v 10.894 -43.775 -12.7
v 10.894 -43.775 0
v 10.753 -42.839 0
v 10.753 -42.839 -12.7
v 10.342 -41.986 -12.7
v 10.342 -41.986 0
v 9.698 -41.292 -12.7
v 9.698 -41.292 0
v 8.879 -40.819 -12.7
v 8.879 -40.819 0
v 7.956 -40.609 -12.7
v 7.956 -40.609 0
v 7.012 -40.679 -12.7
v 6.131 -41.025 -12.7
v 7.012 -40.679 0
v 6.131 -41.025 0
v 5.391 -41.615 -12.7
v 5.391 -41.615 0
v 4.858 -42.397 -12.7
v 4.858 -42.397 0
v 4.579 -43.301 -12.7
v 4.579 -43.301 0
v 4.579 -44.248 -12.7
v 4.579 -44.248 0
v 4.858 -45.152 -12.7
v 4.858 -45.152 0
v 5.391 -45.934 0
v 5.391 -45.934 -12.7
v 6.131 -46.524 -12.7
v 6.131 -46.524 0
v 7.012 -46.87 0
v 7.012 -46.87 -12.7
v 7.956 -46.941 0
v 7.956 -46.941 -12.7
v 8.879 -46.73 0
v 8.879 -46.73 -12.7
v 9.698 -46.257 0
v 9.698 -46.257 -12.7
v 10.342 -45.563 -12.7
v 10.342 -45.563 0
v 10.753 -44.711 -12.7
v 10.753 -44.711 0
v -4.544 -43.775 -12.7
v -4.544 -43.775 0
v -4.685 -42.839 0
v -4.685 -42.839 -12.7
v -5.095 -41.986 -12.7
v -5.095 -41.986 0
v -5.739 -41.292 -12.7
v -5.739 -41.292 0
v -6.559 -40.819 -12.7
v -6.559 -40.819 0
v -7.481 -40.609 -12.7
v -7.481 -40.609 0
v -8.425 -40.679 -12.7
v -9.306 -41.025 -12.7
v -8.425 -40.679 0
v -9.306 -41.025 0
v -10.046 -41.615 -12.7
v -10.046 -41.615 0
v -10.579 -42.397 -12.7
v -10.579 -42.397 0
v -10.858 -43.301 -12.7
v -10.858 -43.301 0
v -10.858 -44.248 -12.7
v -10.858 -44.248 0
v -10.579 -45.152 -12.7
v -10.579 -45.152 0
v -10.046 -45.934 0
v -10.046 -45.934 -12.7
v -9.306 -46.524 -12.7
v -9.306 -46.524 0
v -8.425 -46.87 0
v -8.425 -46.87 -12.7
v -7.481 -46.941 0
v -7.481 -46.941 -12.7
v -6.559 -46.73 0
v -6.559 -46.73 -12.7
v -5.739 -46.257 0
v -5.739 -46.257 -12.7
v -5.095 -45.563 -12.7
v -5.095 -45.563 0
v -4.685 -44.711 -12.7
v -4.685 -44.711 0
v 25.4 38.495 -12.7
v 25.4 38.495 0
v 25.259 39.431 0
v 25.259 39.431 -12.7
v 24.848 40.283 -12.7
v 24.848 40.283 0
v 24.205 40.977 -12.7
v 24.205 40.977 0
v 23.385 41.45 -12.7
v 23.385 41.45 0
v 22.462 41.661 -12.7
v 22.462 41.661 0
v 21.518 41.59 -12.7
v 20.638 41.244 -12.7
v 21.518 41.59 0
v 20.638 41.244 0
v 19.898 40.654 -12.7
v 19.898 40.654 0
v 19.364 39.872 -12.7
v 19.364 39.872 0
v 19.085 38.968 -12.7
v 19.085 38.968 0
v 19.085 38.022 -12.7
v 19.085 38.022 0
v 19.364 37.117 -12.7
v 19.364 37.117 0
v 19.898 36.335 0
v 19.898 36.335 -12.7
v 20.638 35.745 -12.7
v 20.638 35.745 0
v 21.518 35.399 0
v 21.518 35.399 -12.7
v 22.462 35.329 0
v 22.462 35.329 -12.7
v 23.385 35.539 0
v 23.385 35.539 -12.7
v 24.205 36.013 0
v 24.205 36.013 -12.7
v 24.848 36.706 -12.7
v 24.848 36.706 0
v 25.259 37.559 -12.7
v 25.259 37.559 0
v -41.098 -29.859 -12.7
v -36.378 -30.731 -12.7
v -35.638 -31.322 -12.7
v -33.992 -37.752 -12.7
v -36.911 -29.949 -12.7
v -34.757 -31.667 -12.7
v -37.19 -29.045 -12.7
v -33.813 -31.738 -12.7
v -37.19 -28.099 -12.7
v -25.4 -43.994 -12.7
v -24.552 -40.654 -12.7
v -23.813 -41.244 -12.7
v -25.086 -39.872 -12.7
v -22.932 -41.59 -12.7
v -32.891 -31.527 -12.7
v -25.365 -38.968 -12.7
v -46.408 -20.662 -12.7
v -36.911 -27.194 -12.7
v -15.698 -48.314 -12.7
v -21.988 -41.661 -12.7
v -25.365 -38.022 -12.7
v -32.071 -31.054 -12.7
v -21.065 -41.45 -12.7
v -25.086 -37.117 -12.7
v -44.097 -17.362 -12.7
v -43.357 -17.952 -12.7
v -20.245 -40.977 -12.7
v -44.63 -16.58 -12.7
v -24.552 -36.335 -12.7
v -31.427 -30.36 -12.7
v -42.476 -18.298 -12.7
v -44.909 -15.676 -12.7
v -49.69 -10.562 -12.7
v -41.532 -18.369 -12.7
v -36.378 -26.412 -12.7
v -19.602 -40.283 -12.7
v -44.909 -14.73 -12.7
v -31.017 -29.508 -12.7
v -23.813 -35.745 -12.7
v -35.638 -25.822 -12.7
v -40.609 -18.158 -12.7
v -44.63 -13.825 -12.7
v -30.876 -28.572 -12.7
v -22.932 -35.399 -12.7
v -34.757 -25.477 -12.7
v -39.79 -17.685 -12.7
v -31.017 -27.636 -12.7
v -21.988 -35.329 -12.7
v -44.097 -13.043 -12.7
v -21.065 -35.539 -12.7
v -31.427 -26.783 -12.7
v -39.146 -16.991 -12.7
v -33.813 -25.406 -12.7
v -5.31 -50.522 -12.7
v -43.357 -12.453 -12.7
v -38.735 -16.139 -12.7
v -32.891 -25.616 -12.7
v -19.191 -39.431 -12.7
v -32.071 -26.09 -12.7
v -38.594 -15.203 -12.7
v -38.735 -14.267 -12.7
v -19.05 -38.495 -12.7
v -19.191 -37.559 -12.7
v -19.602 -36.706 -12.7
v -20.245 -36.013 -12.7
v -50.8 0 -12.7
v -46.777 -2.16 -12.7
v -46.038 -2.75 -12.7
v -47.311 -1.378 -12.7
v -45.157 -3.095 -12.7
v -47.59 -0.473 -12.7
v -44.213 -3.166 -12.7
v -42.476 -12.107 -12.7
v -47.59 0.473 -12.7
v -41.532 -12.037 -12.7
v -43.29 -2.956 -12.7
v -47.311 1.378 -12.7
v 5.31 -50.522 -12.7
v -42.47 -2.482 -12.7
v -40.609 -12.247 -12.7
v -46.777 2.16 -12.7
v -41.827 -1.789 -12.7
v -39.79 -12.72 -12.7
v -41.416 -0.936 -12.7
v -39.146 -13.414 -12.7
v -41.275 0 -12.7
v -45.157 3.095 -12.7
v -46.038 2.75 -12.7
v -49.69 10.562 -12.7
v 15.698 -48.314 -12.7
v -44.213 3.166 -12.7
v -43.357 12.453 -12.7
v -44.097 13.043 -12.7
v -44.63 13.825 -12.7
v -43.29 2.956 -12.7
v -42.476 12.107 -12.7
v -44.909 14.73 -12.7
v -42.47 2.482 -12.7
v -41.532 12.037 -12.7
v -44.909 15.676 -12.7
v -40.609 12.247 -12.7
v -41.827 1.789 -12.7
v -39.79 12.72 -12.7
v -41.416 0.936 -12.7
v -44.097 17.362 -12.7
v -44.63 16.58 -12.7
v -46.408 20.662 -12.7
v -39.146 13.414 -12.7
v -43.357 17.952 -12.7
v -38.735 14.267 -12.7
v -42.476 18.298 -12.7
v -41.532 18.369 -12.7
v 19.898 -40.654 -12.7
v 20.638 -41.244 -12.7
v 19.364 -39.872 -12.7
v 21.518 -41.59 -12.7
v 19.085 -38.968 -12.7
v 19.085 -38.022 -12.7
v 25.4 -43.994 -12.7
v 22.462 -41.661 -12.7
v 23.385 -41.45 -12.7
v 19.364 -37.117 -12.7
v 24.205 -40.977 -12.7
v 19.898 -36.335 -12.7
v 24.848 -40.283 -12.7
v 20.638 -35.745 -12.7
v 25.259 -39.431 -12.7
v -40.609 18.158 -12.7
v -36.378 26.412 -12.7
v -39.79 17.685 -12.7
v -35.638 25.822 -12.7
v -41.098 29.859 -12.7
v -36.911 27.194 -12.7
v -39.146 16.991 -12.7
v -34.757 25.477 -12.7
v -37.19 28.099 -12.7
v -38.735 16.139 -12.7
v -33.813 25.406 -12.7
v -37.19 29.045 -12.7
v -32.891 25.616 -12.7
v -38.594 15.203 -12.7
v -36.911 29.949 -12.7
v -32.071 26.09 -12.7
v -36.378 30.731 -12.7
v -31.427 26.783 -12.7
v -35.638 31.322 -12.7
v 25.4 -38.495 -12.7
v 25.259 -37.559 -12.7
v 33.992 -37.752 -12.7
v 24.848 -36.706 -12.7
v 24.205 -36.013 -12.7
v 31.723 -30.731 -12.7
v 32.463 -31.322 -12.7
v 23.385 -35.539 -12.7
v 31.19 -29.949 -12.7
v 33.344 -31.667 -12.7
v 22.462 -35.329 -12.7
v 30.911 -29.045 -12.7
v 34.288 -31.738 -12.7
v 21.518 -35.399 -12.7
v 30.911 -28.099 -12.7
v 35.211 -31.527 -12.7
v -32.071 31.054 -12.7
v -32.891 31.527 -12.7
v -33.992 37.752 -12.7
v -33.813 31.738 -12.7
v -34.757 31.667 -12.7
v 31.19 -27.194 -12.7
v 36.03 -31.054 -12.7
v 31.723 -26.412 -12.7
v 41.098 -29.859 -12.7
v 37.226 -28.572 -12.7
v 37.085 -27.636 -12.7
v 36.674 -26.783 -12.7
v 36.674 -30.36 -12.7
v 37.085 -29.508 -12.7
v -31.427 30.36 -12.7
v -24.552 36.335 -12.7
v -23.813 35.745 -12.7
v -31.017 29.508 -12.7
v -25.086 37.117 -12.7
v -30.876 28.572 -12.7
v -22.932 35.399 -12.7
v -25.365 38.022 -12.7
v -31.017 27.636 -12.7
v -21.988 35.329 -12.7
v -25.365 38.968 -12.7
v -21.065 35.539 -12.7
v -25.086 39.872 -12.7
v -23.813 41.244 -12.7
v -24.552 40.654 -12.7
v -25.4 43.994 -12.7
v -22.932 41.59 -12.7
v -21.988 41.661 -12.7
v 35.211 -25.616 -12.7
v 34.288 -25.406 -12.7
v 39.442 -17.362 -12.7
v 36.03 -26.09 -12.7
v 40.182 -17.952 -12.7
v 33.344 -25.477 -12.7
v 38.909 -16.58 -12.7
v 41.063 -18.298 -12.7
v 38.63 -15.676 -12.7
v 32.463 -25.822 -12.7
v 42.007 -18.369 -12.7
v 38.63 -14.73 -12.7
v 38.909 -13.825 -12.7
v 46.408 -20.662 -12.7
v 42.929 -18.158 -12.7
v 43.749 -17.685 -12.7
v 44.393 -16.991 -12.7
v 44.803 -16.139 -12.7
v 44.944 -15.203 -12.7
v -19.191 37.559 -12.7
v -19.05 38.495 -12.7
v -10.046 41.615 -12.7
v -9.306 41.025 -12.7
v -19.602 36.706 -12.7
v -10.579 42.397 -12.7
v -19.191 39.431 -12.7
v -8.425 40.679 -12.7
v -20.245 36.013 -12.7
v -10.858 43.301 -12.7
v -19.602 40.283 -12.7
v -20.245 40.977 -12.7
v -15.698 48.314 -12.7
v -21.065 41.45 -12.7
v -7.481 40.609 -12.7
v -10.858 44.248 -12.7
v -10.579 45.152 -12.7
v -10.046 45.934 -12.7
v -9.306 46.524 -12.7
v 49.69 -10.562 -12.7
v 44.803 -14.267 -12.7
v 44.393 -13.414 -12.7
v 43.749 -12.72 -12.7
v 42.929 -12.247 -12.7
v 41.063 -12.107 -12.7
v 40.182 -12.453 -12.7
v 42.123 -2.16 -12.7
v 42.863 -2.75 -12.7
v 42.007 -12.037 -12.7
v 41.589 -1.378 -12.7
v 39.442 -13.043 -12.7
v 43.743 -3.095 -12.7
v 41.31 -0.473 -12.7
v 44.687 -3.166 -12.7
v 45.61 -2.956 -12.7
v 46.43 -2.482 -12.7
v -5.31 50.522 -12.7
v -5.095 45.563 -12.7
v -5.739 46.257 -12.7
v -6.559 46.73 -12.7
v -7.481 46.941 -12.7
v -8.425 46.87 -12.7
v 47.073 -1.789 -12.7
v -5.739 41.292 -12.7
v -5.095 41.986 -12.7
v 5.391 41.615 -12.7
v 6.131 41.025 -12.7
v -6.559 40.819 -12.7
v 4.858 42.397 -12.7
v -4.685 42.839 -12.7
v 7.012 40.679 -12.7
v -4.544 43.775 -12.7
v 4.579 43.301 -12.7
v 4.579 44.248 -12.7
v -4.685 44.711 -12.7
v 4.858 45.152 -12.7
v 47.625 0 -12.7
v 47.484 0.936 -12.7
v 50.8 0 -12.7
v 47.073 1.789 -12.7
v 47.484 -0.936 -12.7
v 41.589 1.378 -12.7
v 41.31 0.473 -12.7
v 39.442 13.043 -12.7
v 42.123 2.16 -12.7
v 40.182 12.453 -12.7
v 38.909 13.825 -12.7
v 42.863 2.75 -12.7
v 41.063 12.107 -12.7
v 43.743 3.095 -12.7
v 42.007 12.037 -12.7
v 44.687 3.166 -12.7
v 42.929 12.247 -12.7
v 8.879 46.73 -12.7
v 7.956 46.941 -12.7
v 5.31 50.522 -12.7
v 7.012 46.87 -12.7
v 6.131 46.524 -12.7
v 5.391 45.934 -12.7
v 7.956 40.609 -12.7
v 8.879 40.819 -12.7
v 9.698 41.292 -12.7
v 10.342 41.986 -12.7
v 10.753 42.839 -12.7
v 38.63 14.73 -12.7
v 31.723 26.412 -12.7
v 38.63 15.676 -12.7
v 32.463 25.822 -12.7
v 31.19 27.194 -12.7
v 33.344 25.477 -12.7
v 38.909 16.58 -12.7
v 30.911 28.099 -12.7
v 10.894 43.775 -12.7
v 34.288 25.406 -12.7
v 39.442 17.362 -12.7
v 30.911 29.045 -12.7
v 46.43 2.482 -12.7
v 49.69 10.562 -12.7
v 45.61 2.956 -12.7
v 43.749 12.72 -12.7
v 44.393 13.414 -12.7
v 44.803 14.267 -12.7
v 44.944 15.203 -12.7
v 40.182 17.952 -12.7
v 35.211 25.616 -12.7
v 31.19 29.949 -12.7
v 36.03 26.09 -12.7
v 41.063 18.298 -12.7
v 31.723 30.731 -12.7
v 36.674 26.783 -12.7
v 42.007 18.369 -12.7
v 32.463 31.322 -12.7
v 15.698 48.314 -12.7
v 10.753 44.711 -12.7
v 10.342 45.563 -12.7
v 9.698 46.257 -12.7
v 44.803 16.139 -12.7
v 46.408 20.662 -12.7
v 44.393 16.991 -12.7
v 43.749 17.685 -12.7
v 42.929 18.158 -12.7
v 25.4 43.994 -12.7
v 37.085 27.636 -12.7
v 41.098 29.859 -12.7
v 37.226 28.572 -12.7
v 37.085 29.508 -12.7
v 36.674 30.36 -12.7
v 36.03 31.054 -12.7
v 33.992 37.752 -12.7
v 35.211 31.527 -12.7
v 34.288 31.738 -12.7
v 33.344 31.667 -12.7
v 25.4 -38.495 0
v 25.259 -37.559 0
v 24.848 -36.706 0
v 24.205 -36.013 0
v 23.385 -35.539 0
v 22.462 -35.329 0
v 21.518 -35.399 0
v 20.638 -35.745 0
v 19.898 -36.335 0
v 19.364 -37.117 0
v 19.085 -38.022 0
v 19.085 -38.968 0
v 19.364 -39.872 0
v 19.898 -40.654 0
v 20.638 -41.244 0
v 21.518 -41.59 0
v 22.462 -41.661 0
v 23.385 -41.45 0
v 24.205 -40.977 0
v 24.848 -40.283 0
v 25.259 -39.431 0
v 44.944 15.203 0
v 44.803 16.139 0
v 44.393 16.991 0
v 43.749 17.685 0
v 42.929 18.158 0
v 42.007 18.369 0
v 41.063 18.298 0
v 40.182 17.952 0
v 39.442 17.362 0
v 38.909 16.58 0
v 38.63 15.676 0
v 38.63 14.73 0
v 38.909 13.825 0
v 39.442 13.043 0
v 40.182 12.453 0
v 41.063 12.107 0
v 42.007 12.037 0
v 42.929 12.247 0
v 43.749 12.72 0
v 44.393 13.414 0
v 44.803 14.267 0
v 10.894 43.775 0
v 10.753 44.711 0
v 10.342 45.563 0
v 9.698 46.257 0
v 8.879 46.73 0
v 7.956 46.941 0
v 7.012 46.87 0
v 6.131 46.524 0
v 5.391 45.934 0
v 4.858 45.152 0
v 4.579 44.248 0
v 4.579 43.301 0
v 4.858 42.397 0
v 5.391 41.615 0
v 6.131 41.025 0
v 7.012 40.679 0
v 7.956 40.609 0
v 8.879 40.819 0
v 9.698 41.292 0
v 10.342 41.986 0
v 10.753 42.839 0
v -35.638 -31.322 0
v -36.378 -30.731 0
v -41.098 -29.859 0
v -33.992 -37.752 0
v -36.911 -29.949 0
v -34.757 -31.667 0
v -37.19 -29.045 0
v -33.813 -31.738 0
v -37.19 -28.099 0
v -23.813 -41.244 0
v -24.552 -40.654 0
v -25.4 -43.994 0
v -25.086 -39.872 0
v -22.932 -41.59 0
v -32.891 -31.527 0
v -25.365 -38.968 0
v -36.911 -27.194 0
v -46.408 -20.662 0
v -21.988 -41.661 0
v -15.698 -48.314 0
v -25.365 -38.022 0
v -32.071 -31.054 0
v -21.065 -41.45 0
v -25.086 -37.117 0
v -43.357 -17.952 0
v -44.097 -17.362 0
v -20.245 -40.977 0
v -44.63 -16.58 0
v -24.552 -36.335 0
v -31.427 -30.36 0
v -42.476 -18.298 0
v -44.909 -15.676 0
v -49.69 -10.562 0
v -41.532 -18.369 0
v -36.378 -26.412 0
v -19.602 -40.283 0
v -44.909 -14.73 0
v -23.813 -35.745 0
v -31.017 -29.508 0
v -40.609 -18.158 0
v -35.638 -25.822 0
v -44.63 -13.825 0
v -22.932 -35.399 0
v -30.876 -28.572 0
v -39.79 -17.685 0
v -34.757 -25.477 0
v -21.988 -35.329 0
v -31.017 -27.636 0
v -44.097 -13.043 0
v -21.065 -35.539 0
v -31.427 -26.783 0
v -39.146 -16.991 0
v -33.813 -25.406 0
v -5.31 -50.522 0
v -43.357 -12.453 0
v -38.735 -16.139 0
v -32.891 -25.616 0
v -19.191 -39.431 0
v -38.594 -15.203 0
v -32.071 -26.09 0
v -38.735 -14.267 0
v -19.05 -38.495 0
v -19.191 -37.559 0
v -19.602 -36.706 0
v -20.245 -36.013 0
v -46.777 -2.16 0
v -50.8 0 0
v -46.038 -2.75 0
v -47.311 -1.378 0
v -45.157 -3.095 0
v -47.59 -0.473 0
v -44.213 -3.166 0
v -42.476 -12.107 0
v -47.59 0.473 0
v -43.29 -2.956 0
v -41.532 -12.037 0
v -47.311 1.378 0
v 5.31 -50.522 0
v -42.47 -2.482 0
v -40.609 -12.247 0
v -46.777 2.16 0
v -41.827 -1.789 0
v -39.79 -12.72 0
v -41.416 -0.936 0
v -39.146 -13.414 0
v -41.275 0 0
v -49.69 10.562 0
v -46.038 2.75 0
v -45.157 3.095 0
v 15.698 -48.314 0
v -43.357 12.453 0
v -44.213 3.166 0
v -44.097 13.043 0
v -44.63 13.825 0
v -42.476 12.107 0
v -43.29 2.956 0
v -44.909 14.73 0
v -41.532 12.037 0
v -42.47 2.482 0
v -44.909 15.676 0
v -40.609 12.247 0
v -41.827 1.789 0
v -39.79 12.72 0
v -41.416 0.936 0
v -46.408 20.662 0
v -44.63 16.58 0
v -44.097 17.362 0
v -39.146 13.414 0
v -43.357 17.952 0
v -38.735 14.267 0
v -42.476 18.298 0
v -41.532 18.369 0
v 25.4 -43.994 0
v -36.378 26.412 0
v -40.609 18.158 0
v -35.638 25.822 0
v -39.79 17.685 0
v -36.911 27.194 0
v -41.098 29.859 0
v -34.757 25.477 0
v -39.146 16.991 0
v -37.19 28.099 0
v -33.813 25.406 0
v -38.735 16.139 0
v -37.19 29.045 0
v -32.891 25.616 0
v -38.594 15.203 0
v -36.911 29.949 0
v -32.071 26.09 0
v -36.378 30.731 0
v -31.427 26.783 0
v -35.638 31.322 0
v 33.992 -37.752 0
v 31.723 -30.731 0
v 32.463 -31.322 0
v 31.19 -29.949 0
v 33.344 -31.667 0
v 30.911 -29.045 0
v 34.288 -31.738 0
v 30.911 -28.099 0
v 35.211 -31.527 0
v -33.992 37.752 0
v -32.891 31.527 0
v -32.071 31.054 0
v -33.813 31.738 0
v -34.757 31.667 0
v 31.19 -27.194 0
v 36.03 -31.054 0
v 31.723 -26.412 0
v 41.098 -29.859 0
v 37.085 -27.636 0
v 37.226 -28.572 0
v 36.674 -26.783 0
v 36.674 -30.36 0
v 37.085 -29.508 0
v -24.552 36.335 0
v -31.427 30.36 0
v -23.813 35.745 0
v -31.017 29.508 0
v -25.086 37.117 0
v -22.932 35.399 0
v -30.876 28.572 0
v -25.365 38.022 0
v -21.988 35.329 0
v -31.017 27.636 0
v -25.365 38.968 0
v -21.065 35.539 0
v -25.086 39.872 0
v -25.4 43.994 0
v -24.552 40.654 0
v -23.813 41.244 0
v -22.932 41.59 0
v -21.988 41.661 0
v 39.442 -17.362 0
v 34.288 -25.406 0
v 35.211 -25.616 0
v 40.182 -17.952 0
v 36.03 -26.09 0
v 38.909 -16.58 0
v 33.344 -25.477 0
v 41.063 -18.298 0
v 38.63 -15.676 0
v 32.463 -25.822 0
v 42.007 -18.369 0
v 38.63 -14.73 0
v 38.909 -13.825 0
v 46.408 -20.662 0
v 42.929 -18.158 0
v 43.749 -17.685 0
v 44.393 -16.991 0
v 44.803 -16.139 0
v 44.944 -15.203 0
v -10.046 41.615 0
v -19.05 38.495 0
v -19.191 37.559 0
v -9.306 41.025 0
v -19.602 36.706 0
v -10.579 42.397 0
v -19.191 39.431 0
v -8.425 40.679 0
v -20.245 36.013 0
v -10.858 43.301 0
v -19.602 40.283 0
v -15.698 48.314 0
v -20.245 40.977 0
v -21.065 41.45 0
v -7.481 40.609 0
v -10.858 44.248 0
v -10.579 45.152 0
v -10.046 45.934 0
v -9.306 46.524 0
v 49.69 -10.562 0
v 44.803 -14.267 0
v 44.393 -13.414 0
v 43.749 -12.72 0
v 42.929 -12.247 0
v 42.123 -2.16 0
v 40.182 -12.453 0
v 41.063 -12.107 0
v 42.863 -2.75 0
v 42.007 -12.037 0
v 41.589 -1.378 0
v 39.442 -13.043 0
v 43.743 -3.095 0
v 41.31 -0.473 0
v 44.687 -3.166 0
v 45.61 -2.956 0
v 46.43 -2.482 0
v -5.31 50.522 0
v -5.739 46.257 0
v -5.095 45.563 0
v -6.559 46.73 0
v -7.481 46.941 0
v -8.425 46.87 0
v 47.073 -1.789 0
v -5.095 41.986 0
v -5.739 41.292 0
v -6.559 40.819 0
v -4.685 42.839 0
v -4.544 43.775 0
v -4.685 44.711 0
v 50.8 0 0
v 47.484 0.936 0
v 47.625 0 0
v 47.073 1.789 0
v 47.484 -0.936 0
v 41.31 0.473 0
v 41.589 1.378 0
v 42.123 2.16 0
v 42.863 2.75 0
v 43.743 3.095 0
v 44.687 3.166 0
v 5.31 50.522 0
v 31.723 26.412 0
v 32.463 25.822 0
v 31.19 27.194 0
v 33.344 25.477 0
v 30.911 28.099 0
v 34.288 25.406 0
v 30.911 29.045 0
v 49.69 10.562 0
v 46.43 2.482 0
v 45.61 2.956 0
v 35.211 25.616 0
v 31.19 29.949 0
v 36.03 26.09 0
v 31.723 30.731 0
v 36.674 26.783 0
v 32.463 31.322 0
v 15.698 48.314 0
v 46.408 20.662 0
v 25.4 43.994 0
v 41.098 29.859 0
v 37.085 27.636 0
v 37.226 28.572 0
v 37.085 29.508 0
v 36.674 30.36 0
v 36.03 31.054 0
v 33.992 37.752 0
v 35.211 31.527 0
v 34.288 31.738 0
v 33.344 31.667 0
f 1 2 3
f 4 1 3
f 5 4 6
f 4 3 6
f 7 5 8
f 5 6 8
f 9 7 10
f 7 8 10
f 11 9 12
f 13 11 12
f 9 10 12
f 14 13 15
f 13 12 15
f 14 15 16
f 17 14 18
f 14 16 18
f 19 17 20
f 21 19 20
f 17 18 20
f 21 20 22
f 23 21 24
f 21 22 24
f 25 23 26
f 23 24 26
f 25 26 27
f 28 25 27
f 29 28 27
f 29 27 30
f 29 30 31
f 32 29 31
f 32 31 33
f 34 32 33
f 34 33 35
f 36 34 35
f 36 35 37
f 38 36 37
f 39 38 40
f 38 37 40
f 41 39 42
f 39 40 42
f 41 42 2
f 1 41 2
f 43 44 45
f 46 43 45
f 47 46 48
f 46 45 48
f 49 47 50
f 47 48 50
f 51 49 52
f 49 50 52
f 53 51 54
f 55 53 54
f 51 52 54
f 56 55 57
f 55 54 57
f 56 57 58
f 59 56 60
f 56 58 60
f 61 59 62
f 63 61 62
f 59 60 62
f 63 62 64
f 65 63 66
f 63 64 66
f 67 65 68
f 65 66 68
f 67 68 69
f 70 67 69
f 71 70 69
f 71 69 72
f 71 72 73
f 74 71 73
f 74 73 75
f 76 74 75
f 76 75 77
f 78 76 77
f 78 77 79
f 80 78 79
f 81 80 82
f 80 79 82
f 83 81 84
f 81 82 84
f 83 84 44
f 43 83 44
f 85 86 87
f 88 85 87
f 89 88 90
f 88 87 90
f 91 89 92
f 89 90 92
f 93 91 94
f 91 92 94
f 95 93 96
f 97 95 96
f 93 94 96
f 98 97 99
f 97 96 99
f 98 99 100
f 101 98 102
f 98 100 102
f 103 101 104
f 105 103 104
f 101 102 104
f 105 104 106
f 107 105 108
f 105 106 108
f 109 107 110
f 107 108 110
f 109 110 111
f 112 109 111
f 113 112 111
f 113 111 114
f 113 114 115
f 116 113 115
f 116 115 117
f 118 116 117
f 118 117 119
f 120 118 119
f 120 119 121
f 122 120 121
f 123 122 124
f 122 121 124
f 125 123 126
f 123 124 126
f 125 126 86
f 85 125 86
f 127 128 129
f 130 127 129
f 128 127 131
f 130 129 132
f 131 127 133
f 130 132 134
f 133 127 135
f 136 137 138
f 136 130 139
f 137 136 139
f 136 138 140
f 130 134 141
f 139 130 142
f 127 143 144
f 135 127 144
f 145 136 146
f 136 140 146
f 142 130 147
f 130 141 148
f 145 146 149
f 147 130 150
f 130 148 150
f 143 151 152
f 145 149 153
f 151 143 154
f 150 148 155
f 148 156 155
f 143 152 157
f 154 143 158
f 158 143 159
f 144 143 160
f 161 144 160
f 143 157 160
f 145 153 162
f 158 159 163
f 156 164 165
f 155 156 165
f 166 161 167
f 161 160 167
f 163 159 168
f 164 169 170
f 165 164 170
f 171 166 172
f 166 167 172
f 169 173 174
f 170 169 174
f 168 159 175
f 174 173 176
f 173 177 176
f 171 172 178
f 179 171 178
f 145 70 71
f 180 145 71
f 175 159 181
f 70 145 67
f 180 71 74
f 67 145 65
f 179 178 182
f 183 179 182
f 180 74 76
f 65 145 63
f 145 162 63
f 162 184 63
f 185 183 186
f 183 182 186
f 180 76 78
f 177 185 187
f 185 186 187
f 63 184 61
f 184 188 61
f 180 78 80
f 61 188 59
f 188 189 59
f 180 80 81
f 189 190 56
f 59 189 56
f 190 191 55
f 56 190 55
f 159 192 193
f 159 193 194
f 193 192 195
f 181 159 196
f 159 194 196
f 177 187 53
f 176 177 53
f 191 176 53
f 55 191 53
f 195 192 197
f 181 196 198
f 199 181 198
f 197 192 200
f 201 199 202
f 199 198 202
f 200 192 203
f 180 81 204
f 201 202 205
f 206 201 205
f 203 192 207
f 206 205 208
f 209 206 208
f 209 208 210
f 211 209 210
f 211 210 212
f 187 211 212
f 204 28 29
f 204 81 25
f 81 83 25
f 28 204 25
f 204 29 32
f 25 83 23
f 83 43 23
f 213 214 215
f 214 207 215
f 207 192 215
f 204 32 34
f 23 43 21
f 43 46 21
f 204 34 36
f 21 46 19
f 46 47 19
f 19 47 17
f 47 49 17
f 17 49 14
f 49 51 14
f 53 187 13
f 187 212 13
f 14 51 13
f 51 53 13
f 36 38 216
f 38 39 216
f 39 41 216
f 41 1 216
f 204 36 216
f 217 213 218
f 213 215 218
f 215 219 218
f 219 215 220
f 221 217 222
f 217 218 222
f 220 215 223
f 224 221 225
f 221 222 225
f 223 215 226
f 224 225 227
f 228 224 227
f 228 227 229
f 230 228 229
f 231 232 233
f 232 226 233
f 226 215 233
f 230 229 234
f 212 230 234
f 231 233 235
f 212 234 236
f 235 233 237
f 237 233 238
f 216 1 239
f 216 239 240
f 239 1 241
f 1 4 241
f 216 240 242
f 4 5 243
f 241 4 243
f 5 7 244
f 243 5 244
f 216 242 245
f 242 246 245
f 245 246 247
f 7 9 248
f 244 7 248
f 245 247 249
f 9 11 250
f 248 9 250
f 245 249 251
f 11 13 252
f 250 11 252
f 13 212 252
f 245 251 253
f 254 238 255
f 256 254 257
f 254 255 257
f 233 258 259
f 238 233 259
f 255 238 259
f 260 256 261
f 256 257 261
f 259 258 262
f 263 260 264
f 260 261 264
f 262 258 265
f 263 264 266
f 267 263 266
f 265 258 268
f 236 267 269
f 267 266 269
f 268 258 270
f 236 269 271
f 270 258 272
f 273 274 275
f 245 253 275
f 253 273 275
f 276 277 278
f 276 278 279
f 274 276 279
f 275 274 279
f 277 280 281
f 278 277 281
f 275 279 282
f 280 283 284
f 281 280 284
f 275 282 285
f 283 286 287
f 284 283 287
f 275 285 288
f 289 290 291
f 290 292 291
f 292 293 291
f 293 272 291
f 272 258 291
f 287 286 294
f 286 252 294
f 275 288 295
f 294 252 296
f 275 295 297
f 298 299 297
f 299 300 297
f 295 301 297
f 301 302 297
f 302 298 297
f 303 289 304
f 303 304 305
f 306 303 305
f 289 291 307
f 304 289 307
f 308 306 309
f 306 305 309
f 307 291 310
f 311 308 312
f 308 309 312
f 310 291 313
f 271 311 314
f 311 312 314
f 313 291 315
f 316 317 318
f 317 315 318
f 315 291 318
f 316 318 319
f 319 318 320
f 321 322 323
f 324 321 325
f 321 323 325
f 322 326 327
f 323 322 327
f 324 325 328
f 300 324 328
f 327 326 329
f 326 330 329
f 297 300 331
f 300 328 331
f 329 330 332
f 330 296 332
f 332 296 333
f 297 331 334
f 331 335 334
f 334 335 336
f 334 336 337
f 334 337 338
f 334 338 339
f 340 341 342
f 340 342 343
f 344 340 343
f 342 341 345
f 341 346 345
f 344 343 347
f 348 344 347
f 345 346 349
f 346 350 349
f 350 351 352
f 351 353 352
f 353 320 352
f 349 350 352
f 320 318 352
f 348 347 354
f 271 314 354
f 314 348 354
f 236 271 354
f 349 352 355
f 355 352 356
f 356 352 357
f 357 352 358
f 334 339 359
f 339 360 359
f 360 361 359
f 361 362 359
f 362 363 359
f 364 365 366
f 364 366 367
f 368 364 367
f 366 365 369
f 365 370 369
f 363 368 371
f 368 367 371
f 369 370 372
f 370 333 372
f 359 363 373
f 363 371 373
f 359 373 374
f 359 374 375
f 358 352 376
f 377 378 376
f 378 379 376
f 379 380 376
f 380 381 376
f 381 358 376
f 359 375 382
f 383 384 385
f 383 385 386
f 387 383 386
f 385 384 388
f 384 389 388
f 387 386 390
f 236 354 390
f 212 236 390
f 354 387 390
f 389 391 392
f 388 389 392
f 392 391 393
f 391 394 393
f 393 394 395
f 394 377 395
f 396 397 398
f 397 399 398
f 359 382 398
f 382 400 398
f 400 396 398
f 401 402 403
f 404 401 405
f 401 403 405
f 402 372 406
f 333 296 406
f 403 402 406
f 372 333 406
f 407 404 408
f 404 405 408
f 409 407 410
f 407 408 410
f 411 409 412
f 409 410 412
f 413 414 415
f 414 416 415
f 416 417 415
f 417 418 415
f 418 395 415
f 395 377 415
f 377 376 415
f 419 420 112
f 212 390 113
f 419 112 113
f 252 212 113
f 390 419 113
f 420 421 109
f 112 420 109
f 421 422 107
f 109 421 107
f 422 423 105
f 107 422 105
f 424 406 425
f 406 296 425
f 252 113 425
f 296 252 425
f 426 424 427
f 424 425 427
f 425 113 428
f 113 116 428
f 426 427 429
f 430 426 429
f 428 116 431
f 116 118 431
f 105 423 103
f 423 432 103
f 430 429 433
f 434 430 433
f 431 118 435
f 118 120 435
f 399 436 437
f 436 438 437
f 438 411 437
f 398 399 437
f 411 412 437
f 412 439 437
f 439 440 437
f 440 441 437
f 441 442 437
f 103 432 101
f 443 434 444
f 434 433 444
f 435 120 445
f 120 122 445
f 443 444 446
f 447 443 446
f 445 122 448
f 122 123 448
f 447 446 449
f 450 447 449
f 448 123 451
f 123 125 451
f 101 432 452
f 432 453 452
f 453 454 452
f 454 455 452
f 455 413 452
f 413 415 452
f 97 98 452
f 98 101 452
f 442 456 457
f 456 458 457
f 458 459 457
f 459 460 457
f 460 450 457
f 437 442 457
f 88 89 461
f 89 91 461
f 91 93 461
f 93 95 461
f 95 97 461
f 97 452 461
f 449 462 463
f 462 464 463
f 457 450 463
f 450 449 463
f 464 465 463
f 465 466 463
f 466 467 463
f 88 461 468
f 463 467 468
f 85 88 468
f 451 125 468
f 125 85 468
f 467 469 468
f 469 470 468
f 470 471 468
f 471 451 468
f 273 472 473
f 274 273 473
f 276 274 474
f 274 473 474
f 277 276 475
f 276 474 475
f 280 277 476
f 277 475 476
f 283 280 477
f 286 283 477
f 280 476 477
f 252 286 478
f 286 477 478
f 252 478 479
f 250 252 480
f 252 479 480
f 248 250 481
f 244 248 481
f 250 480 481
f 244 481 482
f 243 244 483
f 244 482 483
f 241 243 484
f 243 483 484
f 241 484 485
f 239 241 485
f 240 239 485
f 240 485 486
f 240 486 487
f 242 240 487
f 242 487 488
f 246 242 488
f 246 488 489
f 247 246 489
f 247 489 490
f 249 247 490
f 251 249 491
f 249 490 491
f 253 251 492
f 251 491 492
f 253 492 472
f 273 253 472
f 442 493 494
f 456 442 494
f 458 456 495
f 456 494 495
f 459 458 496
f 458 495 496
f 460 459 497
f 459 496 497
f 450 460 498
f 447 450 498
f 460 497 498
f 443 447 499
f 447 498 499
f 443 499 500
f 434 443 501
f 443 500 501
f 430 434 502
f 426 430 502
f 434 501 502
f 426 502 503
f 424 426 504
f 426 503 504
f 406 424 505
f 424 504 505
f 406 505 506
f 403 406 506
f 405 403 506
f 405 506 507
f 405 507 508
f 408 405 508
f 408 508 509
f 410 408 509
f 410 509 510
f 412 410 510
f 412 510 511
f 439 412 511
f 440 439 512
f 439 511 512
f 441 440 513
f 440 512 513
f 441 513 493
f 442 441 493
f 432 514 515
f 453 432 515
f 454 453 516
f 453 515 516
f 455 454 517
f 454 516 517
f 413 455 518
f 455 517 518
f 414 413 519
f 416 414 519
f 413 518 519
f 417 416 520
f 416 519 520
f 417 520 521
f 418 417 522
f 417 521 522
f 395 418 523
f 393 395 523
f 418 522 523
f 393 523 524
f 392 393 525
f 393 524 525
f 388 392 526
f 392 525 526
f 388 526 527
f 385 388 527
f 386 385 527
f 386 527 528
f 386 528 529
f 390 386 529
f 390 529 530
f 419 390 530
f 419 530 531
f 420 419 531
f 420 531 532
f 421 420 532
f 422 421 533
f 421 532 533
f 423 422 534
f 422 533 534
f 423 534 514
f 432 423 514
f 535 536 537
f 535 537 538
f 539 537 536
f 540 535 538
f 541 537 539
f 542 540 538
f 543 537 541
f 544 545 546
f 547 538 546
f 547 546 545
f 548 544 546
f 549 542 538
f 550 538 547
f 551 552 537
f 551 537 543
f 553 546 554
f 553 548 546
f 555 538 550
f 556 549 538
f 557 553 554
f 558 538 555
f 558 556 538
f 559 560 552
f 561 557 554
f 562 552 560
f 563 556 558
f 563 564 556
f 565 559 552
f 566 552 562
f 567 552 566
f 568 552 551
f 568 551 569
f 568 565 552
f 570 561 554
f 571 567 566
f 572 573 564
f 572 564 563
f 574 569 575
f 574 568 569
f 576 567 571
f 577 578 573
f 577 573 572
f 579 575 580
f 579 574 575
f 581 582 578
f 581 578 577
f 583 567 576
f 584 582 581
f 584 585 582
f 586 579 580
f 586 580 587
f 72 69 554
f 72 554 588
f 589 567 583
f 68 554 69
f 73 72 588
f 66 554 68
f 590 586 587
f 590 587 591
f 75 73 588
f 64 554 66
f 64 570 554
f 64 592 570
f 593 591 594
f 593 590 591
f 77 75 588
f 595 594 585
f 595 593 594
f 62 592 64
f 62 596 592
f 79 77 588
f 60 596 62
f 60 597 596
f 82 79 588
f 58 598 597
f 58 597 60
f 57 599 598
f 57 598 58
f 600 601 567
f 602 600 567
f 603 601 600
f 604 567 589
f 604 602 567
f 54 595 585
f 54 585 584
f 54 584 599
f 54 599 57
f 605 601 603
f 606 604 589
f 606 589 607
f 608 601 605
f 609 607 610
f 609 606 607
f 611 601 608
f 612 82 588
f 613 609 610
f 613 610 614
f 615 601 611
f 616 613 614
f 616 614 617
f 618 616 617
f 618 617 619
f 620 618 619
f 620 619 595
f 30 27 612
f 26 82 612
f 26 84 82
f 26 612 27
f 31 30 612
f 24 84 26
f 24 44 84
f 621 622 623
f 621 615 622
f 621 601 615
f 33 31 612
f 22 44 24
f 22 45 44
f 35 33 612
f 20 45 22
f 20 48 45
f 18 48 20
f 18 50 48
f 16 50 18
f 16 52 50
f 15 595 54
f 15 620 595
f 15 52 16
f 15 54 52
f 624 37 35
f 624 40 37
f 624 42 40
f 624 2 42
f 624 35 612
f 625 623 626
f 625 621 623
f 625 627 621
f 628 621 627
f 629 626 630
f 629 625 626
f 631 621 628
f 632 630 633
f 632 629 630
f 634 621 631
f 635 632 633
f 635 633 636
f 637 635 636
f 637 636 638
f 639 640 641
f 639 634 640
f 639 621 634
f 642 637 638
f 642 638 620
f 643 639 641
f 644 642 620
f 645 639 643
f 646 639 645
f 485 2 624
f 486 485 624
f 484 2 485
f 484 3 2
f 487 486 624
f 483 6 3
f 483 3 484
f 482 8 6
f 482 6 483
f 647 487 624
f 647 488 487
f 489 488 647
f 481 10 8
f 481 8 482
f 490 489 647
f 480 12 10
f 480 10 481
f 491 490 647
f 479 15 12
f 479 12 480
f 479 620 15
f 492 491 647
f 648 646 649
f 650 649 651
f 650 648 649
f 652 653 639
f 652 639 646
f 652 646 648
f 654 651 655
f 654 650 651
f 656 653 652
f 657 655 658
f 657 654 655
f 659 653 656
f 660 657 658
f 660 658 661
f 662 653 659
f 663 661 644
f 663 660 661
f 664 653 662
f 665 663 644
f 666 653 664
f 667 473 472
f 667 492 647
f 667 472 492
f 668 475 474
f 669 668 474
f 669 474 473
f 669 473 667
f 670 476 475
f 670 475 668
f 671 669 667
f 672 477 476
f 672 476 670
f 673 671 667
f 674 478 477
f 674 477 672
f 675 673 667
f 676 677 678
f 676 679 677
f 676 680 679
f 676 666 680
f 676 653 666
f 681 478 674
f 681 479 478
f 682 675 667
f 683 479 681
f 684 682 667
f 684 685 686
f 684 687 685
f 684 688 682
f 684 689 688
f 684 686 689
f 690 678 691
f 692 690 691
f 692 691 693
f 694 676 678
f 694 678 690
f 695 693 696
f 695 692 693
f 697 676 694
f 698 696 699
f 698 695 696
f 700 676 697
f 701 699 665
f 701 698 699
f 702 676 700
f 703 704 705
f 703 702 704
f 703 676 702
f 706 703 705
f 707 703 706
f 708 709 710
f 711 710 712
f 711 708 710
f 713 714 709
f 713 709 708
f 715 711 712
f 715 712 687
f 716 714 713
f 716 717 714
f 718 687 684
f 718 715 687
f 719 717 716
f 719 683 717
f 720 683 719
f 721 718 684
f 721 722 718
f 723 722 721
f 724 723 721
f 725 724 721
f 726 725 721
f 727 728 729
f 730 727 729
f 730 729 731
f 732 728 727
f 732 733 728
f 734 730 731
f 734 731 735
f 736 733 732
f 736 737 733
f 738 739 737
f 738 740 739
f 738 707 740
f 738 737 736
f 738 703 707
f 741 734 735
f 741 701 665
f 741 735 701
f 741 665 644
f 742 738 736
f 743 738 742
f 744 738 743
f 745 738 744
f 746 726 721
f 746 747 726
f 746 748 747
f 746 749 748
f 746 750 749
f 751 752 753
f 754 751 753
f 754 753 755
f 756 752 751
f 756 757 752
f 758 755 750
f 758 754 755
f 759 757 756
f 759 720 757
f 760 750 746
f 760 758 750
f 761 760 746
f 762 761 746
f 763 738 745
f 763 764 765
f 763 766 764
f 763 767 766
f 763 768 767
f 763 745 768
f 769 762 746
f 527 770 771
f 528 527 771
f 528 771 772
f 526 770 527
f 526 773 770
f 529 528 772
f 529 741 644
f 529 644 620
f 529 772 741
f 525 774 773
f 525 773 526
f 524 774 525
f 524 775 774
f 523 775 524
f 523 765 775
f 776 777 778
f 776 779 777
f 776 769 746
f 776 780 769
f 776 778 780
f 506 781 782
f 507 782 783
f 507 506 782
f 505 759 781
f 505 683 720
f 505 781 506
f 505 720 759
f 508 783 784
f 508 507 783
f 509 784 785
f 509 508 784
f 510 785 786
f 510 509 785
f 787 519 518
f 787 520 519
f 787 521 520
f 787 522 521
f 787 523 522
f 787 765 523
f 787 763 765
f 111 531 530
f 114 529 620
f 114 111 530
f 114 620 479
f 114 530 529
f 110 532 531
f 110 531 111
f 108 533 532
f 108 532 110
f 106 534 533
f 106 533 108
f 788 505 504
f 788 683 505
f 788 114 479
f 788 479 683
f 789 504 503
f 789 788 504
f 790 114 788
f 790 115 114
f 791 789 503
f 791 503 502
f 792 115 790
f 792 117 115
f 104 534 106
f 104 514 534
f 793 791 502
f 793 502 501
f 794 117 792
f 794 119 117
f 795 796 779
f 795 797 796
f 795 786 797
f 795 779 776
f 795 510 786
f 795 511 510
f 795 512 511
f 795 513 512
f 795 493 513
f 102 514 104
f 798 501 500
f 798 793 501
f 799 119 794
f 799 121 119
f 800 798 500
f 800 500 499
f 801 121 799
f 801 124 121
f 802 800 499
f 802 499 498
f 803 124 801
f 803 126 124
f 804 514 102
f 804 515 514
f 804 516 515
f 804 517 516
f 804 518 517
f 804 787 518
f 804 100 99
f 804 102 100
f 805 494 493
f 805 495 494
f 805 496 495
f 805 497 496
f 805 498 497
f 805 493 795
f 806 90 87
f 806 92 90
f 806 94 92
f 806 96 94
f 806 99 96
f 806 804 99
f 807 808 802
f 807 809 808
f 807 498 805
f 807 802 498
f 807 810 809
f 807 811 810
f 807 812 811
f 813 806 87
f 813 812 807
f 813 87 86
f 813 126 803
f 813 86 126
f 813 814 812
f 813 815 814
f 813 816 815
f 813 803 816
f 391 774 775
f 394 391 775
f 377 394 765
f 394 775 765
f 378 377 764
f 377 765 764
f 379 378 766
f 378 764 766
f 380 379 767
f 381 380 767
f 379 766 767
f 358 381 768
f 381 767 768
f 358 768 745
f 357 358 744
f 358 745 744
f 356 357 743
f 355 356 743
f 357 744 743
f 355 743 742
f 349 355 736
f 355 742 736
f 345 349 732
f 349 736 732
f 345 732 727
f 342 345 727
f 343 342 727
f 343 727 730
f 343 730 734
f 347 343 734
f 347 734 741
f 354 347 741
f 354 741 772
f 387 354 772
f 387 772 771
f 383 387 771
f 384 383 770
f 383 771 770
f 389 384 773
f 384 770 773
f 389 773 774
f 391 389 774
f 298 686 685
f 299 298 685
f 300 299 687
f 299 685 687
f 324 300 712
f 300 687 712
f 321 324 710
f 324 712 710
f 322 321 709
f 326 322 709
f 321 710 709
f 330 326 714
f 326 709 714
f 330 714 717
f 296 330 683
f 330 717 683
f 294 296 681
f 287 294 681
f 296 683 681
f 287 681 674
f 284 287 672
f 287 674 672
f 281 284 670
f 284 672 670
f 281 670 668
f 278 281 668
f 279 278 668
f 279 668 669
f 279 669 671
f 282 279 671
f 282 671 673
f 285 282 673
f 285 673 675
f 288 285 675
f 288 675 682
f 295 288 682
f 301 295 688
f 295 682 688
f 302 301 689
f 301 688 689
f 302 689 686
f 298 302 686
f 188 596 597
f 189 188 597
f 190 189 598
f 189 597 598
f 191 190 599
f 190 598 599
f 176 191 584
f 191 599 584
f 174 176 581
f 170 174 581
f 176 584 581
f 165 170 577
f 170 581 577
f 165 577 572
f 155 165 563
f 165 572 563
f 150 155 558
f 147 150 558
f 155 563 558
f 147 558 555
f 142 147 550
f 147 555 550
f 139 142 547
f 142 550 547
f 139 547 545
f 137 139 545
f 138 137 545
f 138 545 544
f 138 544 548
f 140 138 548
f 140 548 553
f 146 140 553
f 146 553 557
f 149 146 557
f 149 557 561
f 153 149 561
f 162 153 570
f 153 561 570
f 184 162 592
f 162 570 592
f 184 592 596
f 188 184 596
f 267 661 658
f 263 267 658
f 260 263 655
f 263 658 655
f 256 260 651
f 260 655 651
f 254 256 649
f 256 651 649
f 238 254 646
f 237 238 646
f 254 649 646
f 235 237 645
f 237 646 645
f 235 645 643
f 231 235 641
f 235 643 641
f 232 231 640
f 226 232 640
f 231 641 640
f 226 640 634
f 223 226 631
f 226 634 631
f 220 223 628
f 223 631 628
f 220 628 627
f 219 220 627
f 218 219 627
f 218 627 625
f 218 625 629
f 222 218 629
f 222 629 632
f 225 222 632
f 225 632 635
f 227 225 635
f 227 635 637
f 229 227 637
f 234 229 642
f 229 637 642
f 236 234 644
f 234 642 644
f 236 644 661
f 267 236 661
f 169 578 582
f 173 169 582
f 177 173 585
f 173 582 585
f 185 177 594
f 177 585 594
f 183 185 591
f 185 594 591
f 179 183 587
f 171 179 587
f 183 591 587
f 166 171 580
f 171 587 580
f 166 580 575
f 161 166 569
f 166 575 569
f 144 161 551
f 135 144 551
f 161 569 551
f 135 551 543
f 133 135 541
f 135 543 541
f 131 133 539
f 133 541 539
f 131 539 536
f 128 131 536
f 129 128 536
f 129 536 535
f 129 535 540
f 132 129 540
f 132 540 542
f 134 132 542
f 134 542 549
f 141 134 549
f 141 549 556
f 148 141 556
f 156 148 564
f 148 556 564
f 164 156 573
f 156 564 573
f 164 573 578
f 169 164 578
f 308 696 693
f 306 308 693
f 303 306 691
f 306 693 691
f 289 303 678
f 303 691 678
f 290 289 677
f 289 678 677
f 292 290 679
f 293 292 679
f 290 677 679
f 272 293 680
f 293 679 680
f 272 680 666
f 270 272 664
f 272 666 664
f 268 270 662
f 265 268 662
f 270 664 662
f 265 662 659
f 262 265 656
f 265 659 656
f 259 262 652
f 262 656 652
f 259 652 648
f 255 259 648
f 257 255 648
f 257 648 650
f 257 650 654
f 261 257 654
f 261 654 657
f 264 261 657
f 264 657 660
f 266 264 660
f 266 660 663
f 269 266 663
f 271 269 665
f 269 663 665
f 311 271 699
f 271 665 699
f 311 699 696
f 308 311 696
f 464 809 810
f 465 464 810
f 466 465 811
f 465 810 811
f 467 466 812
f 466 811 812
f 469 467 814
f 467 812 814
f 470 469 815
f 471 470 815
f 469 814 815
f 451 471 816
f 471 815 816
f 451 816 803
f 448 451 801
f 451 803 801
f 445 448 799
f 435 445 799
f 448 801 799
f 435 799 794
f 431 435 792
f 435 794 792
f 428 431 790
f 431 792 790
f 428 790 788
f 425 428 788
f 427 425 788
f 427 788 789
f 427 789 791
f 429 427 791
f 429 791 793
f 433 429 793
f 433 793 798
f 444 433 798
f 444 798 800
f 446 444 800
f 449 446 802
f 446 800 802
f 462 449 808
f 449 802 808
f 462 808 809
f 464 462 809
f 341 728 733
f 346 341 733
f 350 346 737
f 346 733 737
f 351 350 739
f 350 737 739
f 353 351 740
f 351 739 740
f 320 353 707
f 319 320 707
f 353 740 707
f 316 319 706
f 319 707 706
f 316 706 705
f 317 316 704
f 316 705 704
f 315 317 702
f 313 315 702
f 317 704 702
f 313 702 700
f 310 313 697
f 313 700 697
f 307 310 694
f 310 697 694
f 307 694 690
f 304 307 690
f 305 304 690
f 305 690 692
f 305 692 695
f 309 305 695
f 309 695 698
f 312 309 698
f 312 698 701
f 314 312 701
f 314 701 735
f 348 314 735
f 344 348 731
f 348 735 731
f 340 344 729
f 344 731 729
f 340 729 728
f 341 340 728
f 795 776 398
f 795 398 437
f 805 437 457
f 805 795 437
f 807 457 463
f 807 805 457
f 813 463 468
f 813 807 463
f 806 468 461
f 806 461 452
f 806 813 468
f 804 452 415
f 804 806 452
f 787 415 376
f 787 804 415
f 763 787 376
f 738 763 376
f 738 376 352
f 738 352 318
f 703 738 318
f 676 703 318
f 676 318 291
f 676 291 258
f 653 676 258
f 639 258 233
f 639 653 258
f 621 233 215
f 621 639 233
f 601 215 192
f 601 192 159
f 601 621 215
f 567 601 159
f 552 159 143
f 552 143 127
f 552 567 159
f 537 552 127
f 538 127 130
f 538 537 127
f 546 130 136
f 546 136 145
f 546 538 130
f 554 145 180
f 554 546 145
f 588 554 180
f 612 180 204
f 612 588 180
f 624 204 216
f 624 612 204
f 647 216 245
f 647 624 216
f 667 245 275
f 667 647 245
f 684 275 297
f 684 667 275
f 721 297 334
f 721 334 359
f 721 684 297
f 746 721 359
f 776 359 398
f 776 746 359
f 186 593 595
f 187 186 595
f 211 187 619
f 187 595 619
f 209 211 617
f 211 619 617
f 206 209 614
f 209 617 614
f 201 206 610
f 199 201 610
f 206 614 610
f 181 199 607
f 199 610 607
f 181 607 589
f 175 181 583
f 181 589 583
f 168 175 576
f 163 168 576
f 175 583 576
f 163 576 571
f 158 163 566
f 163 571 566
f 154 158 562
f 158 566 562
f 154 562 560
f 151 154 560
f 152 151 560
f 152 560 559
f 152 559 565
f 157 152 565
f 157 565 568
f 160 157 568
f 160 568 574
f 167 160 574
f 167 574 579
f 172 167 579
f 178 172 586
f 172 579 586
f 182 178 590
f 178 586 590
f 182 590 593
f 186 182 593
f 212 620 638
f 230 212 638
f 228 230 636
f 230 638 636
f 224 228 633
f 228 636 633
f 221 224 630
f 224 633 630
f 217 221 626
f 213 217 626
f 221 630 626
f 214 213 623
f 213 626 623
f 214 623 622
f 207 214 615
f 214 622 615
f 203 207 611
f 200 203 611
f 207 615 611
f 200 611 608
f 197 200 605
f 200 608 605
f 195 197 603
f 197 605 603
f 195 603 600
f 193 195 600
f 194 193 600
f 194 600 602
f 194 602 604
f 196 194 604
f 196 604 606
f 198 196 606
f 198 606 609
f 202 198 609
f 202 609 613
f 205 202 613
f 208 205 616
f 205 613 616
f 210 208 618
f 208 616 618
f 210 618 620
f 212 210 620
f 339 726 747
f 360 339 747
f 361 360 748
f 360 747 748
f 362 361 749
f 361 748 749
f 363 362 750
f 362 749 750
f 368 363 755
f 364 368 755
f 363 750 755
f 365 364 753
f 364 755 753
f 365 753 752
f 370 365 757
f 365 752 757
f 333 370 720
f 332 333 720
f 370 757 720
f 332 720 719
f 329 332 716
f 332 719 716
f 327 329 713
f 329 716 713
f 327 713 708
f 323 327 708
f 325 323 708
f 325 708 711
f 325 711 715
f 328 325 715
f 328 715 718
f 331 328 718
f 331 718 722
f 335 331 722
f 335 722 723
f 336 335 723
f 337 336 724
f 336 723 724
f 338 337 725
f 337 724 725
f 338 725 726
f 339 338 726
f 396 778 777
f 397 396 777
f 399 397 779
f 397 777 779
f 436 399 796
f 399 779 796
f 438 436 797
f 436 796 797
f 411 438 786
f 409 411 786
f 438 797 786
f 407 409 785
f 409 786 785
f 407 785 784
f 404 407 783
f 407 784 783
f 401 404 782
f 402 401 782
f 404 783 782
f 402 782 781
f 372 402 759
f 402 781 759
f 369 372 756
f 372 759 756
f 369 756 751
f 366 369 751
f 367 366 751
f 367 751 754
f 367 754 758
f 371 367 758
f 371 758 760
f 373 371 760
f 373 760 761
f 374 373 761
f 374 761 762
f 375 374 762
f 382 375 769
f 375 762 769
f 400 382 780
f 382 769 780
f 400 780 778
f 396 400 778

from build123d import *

# Parameters (mm, degrees)
SKETCH1_R           = 50.8
BOSS_EXTRUDE2_DEPTH = 12.7
SKETCH1_7_R         = 3.175
CUT_EXTRUDE1_DEPTH  = 12.7


with BuildPart() as part:
    # Sketch1 → Boss-Extrude2 (new body)
    with BuildSketch(Plane.XY):
        Circle(SKETCH1_R)
    extrude(amount=-BOSS_EXTRUDE2_DEPTH)

    # Sketch1<7> → Cut-Extrude1 (cut)
    with BuildSketch(Plane.XY):
        with Locations((-44.45, 0)):
            Circle(SKETCH1_7_R)
        with Locations((-41.769336994, 15.202795371)):
            Circle(SKETCH1_7_R)
        with Locations((-34.050675497, 28.571909251)):
            Circle(SKETCH1_7_R)
        with Locations((-22.225, 38.494829198)):
            Circle(SKETCH1_7_R)
        with Locations((-7.718661497, 43.774704621)):
            Circle(SKETCH1_7_R)
        with Locations((7.718661497, 43.774704621)):
            Circle(SKETCH1_7_R)
        with Locations((22.225, 38.494829198)):
            Circle(SKETCH1_7_R)
        with Locations((34.050675497, 28.571909251)):
            Circle(SKETCH1_7_R)
        with Locations((41.769336994, 15.202795371)):
            Circle(SKETCH1_7_R)
        with Locations((44.45, 0)):
            Circle(SKETCH1_7_R)
        with Locations((41.769336994, -15.202795371)):
            Circle(SKETCH1_7_R)
        with Locations((34.050675497, -28.571909251)):
            Circle(SKETCH1_7_R)
        with Locations((22.225, -38.494829198)):
            Circle(SKETCH1_7_R)
        with Locations((7.718661497, -43.774704621)):
            Circle(SKETCH1_7_R)
        with Locations((-7.718661497, -43.774704621)):
            Circle(SKETCH1_7_R)
        with Locations((-22.225, -38.494829198)):
            Circle(SKETCH1_7_R)
        with Locations((-34.050675497, -28.571909251)):
            Circle(SKETCH1_7_R)
        with Locations((-41.769336994, -15.202795371)):
            Circle(SKETCH1_7_R)
    extrude(amount=-CUT_EXTRUDE1_DEPTH, mode=Mode.SUBTRACT)


solid = part.part
